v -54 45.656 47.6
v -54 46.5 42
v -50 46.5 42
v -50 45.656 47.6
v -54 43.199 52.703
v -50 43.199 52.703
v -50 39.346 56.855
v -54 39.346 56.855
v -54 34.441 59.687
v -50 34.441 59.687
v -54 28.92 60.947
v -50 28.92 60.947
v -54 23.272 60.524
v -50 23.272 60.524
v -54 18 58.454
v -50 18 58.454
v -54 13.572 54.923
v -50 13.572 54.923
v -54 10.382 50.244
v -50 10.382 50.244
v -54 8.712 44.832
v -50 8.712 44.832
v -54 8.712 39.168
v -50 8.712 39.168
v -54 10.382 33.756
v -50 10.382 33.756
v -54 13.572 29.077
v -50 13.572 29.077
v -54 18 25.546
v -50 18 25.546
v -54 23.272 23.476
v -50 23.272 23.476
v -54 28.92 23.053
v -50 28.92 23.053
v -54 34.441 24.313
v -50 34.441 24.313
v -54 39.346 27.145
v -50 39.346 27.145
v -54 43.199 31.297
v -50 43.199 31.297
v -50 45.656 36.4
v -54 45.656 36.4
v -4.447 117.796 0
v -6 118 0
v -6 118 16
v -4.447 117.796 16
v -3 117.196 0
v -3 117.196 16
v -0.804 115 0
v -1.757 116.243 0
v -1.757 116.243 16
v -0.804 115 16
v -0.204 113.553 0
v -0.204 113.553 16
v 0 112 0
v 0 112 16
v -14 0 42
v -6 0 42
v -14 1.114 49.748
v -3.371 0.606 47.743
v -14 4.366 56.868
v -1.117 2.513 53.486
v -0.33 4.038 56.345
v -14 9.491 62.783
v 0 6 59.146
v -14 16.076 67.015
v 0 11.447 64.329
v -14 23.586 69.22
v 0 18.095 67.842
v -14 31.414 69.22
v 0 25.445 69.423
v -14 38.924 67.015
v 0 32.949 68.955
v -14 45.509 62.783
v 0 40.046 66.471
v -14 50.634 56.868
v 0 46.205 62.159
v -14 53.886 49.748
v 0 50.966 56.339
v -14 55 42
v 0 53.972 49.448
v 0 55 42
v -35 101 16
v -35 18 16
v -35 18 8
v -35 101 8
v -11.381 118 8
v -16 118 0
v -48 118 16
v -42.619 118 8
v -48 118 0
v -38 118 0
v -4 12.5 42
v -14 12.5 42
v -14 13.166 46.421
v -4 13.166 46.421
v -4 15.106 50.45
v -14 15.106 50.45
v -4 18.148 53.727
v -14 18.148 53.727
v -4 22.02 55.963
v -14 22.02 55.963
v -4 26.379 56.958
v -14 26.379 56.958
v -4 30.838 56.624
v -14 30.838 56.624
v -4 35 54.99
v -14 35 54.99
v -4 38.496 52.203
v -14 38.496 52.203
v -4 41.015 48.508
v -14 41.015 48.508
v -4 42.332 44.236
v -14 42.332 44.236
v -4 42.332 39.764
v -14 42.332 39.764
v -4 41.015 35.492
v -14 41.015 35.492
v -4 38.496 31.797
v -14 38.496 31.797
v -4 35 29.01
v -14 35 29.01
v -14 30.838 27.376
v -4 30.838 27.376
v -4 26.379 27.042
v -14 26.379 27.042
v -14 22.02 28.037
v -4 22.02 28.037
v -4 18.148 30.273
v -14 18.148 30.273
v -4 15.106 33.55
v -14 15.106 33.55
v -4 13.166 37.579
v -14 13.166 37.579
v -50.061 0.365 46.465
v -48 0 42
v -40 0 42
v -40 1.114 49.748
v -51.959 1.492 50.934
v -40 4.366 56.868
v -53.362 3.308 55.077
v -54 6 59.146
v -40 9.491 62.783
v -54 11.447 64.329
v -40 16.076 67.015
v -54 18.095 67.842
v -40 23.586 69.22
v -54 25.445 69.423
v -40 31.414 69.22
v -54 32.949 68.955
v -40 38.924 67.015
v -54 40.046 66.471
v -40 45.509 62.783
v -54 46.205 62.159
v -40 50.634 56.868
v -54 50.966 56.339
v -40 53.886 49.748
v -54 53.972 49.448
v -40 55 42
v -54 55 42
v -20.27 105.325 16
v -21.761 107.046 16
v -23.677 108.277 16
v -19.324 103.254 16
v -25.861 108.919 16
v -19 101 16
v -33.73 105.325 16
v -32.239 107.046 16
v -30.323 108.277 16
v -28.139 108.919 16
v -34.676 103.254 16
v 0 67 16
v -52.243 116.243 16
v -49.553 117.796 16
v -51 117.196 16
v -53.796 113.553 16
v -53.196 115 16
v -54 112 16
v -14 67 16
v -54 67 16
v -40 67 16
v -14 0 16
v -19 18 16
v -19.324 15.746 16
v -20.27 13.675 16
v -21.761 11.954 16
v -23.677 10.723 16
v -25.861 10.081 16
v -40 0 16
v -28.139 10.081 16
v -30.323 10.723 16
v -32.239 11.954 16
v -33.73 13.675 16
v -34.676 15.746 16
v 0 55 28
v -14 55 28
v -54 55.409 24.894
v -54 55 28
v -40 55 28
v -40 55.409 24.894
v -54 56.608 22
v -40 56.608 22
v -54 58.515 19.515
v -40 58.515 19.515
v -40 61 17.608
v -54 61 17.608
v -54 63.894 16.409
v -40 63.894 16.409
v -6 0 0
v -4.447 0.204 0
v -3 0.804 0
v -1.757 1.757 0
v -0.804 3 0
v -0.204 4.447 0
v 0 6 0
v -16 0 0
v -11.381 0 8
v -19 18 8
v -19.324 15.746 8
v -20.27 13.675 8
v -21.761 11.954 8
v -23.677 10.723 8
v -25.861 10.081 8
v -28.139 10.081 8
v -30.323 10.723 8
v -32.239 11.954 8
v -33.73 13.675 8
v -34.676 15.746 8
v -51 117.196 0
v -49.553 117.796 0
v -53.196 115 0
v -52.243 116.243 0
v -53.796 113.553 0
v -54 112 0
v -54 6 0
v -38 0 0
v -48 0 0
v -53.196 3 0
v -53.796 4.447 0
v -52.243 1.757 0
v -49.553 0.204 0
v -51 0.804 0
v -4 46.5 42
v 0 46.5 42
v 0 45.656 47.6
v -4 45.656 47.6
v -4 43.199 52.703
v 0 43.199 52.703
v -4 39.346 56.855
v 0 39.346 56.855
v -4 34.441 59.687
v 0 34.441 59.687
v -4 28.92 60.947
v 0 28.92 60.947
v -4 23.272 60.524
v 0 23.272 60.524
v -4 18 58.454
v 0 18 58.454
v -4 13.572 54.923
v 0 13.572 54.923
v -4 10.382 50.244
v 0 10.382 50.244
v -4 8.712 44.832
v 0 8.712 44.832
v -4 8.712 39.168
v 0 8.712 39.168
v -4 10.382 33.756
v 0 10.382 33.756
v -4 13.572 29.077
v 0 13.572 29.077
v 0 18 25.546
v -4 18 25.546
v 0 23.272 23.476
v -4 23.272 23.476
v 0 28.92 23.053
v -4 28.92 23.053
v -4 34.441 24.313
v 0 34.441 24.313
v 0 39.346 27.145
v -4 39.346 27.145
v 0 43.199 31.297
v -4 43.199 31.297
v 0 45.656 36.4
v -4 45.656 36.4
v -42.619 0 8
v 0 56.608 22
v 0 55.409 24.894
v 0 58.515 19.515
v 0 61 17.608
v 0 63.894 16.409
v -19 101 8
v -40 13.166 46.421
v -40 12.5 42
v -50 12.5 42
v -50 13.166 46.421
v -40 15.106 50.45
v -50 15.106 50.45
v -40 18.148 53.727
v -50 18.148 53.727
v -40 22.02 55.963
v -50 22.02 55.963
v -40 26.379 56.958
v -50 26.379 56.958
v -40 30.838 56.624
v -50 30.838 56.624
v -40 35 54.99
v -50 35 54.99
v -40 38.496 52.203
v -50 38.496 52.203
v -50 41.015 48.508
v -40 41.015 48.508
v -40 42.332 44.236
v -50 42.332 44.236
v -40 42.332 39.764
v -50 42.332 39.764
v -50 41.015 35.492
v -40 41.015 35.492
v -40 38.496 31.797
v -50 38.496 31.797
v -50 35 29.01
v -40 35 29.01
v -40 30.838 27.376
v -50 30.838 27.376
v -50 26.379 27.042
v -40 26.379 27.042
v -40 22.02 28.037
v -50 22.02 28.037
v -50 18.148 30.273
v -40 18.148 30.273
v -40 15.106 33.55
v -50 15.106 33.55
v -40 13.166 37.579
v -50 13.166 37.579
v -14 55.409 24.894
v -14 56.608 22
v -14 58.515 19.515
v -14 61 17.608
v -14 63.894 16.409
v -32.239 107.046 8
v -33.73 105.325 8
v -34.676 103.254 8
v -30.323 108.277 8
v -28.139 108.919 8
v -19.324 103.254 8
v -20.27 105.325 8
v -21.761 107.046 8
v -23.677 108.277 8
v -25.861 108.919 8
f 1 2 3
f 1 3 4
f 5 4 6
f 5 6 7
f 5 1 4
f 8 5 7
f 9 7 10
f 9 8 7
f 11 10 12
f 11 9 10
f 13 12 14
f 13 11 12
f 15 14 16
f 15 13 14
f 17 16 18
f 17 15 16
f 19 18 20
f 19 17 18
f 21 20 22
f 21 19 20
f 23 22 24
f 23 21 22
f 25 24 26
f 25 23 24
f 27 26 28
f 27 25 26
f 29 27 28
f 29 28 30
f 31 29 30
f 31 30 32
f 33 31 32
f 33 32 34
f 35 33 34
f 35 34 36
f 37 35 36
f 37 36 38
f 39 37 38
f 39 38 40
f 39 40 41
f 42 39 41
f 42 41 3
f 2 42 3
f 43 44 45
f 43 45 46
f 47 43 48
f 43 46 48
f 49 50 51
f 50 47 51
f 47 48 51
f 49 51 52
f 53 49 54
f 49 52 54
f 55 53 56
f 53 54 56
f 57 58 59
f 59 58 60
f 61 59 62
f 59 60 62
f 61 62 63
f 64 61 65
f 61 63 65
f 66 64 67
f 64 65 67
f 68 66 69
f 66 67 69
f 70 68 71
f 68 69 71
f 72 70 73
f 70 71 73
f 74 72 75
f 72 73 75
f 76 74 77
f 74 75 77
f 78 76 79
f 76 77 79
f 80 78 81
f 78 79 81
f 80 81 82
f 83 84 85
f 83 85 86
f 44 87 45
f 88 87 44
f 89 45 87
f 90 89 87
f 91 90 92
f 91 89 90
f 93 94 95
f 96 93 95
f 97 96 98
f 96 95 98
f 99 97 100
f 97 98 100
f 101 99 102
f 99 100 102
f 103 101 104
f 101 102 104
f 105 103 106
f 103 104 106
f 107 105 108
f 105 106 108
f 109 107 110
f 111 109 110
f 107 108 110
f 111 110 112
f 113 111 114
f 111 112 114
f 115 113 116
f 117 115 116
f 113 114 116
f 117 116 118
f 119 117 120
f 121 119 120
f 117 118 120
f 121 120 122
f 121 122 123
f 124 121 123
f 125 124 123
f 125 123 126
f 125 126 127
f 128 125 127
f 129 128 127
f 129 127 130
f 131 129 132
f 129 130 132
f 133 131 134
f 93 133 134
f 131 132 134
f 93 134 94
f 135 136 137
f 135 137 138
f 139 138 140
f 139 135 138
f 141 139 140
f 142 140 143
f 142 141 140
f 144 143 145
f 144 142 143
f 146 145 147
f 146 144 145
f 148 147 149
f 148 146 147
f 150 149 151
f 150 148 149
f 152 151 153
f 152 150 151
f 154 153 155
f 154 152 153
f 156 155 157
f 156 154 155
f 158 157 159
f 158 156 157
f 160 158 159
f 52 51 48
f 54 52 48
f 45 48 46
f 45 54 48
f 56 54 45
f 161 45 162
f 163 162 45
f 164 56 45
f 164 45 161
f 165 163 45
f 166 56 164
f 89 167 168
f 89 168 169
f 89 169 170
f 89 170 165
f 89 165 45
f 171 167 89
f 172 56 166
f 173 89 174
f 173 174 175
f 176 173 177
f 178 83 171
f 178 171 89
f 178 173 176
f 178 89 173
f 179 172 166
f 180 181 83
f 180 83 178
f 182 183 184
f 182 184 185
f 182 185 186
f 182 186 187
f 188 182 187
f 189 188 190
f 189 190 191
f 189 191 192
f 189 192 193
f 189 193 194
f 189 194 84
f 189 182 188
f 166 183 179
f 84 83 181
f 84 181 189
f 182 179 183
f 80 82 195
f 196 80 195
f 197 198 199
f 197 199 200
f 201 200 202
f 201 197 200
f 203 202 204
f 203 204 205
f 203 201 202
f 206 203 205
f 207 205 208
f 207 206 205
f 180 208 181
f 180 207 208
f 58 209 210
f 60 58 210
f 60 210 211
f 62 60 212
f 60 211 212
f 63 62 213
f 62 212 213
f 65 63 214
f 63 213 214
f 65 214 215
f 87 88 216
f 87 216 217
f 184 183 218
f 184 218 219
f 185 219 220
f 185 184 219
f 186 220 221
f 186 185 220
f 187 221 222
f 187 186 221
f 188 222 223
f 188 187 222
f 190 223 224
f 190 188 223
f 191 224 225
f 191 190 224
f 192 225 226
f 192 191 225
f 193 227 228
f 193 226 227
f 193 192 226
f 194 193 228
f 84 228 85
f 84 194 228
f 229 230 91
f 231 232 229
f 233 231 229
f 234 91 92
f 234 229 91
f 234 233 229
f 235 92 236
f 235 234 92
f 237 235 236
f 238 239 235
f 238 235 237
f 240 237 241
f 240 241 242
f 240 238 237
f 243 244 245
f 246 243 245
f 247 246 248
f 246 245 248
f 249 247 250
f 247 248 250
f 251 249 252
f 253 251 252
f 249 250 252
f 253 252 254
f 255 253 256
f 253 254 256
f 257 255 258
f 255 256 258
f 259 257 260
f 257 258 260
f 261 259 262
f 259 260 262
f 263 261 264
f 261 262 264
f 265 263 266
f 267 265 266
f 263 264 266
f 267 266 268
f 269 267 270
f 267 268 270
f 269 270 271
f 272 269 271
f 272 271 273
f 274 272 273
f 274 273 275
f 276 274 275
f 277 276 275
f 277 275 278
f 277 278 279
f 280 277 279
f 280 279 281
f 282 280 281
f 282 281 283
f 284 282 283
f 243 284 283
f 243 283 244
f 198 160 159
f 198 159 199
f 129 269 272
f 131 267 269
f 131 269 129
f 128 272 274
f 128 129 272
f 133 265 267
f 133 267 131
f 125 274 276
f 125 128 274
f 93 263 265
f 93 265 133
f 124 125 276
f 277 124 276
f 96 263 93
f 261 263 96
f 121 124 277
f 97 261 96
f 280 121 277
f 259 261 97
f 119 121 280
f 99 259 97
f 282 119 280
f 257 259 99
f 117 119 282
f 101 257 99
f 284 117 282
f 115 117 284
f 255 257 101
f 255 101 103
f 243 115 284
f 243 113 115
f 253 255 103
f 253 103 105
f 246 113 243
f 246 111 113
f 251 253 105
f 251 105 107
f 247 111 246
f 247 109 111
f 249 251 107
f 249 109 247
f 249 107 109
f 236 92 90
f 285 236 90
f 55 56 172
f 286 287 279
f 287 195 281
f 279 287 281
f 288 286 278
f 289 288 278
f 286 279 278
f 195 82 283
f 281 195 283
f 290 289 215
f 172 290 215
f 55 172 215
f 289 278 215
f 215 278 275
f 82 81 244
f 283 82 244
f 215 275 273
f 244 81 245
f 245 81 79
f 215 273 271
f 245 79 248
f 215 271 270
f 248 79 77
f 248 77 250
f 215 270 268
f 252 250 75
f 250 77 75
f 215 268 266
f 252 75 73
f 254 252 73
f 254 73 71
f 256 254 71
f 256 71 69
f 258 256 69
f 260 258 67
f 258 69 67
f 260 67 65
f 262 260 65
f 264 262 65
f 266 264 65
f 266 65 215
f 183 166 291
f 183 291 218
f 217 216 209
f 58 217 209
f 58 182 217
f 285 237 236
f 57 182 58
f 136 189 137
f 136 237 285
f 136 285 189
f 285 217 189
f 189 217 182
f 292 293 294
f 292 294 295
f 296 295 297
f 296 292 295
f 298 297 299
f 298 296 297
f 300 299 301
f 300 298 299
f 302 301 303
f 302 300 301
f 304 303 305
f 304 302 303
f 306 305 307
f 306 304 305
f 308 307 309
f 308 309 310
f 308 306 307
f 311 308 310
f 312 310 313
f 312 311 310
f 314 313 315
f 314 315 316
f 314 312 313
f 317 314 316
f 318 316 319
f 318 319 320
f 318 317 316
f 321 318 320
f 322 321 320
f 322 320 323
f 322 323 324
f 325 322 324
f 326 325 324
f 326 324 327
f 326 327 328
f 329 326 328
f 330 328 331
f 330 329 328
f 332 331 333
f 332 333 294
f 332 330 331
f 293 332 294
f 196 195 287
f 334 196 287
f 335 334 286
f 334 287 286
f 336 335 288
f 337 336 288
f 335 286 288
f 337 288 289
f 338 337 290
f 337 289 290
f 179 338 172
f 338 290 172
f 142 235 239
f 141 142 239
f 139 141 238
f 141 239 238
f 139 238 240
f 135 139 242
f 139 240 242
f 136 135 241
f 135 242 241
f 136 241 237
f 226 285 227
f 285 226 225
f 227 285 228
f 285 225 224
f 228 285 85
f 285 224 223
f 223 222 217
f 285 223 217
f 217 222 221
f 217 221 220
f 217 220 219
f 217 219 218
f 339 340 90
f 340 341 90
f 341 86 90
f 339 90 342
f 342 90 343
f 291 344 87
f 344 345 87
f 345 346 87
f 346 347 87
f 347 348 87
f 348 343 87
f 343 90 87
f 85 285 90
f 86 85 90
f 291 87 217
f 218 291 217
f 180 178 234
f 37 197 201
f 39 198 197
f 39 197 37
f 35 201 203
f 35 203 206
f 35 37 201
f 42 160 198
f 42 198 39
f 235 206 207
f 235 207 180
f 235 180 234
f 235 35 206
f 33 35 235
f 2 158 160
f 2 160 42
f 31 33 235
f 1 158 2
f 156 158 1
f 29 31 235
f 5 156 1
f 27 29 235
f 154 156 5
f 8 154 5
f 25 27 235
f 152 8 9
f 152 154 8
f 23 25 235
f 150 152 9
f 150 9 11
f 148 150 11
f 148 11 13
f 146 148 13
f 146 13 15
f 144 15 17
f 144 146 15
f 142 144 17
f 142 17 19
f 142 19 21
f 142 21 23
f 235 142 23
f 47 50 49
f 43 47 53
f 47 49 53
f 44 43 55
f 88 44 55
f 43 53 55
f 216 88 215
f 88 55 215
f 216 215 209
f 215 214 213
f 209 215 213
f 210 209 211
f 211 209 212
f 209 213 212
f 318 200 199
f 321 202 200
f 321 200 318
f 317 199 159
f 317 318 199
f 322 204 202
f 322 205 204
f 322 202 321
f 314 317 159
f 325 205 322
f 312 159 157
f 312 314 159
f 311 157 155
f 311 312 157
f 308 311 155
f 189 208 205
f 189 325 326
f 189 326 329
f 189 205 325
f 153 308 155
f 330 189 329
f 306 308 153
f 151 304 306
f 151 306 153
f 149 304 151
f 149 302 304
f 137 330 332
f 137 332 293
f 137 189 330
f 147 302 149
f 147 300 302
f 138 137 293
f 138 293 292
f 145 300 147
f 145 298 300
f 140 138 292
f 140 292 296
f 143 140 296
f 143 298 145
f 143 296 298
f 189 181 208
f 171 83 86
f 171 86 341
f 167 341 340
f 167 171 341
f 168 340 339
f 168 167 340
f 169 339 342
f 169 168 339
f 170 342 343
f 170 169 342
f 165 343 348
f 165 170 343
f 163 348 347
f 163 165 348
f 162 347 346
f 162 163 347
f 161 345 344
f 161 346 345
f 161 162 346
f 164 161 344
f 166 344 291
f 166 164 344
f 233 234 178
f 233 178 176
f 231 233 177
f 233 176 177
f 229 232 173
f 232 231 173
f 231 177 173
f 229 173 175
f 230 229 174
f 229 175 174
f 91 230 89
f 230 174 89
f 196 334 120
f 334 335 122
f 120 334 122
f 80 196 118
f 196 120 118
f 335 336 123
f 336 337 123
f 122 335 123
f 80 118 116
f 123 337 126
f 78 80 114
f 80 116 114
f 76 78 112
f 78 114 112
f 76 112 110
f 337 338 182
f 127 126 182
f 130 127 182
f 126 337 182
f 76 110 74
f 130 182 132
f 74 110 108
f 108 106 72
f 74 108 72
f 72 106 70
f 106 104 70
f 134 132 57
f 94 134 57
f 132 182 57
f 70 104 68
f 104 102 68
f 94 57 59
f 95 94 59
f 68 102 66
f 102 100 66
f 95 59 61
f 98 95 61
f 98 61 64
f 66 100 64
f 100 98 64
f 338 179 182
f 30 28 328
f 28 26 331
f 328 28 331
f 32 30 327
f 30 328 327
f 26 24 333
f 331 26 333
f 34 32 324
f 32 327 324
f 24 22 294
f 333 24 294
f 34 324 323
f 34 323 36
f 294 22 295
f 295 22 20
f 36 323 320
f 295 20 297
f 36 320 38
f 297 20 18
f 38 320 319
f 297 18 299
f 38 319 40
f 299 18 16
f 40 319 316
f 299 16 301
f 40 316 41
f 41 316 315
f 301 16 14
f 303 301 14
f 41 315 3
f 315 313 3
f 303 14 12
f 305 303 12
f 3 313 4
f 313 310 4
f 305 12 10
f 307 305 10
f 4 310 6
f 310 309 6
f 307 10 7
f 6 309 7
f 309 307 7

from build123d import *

# Parameters (mm, degrees)
BOSS_EXTRUDE1_DEPTH                     = 27
CBORE_FOR_M5_HEX_HEAD_BOLT1_D           = 30
CBORE_FOR_M5_HEX_HEAD_BOLT1_CBORE_D     = 38
CBORE_FOR_M5_HEX_HEAD_BOLT1_CBORE_DEPTH = 4
SKETCH5_W                               = 13
SKETCH5_H                               = 53.5
CUT_EXTRUDE2_DEPTH                      = 140.582412932
CUT_EXTRUDE3_DEPTH                      = 140.582412932
CUT_EXTRUDE3_DEPTH_BACK                 = 140.582412932
CUT_EXTRUDE4_DEPTH                      = 141.36470354
FILLET1_R                               = 6
FILLET2_R                               = 6


with BuildPart() as part:
    # Sketch1 → Boss-Extrude1 (new body)
    with BuildSketch(Plane.YZ):
        with BuildLine():
            Line((0, 0), (0, 42))
            ThreePointArc((0, 42), (27.5, 69.5), (55, 42))
            Line((55, 42), (55, 28))
            ThreePointArc((55, 28), (58.514718626, 19.514718626), (67, 16))
            Line((67, 16), (118, 16))
            Line((118, 16), (118, 0))
            Line((118, 0), (0, 0))
        make_face()
    extrude(amount=-BOSS_EXTRUDE1_DEPTH)

    # CBORE for M5 Hex Head Bolt1 (through all)
    with Locations(Plane.YZ):
        with Locations((27.5, 42)):
            CounterBoreHole(CBORE_FOR_M5_HEX_HEAD_BOLT1_D / 2, CBORE_FOR_M5_HEX_HEAD_BOLT1_CBORE_D / 2, CBORE_FOR_M5_HEX_HEAD_BOLT1_CBORE_DEPTH)

    # Sketch5 → Cut-Extrude2 (cut, through all)
    with BuildSketch(Plane.XZ):
        with Locations((-20.5, 42.75)):
            Rectangle(SKETCH5_W, SKETCH5_H)
    extrude(amount=-CUT_EXTRUDE2_DEPTH, mode=Mode.SUBTRACT)

    # Sketch6 → Cut-Extrude3 (cut, two sides: drawn at the far end of the back side and taken through both)
    with BuildSketch(Plane.XZ.offset(-CUT_EXTRUDE3_DEPTH_BACK)):
        Polygon((-92.317950055, -132.186567024), (-16, 0), (-11.381197846, 8), (-27, 8), (-179.635900109, 8), (-438.753666214, -153.396577713), (-351.43571616, -293.583144737), align=None)
    extrude(amount=CUT_EXTRUDE3_DEPTH + CUT_EXTRUDE3_DEPTH_BACK, mode=Mode.SUBTRACT)

    # Mirror1: part across plane


with BuildPart() as part_1:
    add(part.part)
    add(part.part.mirror(Plane(origin=(-27, 27.5, 42), x_dir=(0, 0, 1), z_dir=(-1, 0, 0))))

    # Sketch7 → Cut-Extrude4 (cut, through all)
    with BuildSketch(Plane.XY.offset(16)):
        with BuildLine():
            Line((-19, 101), (-19, 18))
            ThreePointArc((-19, 18), (-27, 10), (-35, 18))
            Line((-35, 18), (-35, 101))
            ThreePointArc((-35, 101), (-27, 109), (-19, 101))
        make_face()
    extrude(amount=-CUT_EXTRUDE4_DEPTH, mode=Mode.SUBTRACT)

    # Fillet1
    # the kernel refuses this fillet: 6 mm, written as the material it takes off along each edge
    with BuildSketch(Plane(origin=(0, 0, -36), x_dir=(0, 1, 0), z_dir=(0, 0, 1))) as fillet1_piece_1:
        with BuildLine():
            CenterArc((FILLET1_R, FILLET1_R), FILLET1_R, 180, 90)
            Line((0, FILLET1_R), (-FILLET1_R * 0.02, FILLET1_R))
            Line((-FILLET1_R * 0.02, FILLET1_R), (-FILLET1_R * 0.02, -FILLET1_R * 0.02))
            Line((-FILLET1_R * 0.02, -FILLET1_R * 0.02), (FILLET1_R, -FILLET1_R * 0.02))
            Line((FILLET1_R, -FILLET1_R * 0.02), (FILLET1_R, 0))
        make_face()
    extrude(amount=114, mode=Mode.SUBTRACT)

    # Fillet2
    # the kernel refuses this fillet: 6 mm, written as the material it takes off along each edge
    with BuildSketch(Plane(origin=(-54, 0, -36), x_dir=(0, 1, 0), z_dir=(0, 0, 1))) as fillet2_piece_1:
        with BuildLine():
            CenterArc((FILLET2_R, -FILLET2_R), FILLET2_R, 90, 90)
            Line((0, -FILLET2_R), (-FILLET2_R * 0.02, -FILLET2_R))
            Line((-FILLET2_R * 0.02, -FILLET2_R), (-FILLET2_R * 0.02, FILLET2_R * 0.02))
            Line((-FILLET2_R * 0.02, FILLET2_R * 0.02), (FILLET2_R, FILLET2_R * 0.02))
            Line((FILLET2_R, FILLET2_R * 0.02), (FILLET2_R, 0))
        make_face()
    extrude(amount=114, mode=Mode.SUBTRACT)
    with BuildSketch(Plane(origin=(-54, 118, 52), x_dir=(1, 0, 0), z_dir=(0, 0, -1)), Plane(origin=(0, 118, 52), x_dir=(0, -1, 0), z_dir=(0, 0, -1))) as fillet2_piece_2:
        with BuildLine():
            CenterArc((FILLET2_R, FILLET2_R), FILLET2_R, 180, 90)
            Line((0, FILLET2_R), (-FILLET2_R * 0.02, FILLET2_R))
            Line((-FILLET2_R * 0.02, FILLET2_R), (-FILLET2_R * 0.02, -FILLET2_R * 0.02))
            Line((-FILLET2_R * 0.02, -FILLET2_R * 0.02), (FILLET2_R, -FILLET2_R * 0.02))
            Line((FILLET2_R, -FILLET2_R * 0.02), (FILLET2_R, 0))
        make_face()
    extrude(amount=88, mode=Mode.SUBTRACT)


solid = part_1.part
